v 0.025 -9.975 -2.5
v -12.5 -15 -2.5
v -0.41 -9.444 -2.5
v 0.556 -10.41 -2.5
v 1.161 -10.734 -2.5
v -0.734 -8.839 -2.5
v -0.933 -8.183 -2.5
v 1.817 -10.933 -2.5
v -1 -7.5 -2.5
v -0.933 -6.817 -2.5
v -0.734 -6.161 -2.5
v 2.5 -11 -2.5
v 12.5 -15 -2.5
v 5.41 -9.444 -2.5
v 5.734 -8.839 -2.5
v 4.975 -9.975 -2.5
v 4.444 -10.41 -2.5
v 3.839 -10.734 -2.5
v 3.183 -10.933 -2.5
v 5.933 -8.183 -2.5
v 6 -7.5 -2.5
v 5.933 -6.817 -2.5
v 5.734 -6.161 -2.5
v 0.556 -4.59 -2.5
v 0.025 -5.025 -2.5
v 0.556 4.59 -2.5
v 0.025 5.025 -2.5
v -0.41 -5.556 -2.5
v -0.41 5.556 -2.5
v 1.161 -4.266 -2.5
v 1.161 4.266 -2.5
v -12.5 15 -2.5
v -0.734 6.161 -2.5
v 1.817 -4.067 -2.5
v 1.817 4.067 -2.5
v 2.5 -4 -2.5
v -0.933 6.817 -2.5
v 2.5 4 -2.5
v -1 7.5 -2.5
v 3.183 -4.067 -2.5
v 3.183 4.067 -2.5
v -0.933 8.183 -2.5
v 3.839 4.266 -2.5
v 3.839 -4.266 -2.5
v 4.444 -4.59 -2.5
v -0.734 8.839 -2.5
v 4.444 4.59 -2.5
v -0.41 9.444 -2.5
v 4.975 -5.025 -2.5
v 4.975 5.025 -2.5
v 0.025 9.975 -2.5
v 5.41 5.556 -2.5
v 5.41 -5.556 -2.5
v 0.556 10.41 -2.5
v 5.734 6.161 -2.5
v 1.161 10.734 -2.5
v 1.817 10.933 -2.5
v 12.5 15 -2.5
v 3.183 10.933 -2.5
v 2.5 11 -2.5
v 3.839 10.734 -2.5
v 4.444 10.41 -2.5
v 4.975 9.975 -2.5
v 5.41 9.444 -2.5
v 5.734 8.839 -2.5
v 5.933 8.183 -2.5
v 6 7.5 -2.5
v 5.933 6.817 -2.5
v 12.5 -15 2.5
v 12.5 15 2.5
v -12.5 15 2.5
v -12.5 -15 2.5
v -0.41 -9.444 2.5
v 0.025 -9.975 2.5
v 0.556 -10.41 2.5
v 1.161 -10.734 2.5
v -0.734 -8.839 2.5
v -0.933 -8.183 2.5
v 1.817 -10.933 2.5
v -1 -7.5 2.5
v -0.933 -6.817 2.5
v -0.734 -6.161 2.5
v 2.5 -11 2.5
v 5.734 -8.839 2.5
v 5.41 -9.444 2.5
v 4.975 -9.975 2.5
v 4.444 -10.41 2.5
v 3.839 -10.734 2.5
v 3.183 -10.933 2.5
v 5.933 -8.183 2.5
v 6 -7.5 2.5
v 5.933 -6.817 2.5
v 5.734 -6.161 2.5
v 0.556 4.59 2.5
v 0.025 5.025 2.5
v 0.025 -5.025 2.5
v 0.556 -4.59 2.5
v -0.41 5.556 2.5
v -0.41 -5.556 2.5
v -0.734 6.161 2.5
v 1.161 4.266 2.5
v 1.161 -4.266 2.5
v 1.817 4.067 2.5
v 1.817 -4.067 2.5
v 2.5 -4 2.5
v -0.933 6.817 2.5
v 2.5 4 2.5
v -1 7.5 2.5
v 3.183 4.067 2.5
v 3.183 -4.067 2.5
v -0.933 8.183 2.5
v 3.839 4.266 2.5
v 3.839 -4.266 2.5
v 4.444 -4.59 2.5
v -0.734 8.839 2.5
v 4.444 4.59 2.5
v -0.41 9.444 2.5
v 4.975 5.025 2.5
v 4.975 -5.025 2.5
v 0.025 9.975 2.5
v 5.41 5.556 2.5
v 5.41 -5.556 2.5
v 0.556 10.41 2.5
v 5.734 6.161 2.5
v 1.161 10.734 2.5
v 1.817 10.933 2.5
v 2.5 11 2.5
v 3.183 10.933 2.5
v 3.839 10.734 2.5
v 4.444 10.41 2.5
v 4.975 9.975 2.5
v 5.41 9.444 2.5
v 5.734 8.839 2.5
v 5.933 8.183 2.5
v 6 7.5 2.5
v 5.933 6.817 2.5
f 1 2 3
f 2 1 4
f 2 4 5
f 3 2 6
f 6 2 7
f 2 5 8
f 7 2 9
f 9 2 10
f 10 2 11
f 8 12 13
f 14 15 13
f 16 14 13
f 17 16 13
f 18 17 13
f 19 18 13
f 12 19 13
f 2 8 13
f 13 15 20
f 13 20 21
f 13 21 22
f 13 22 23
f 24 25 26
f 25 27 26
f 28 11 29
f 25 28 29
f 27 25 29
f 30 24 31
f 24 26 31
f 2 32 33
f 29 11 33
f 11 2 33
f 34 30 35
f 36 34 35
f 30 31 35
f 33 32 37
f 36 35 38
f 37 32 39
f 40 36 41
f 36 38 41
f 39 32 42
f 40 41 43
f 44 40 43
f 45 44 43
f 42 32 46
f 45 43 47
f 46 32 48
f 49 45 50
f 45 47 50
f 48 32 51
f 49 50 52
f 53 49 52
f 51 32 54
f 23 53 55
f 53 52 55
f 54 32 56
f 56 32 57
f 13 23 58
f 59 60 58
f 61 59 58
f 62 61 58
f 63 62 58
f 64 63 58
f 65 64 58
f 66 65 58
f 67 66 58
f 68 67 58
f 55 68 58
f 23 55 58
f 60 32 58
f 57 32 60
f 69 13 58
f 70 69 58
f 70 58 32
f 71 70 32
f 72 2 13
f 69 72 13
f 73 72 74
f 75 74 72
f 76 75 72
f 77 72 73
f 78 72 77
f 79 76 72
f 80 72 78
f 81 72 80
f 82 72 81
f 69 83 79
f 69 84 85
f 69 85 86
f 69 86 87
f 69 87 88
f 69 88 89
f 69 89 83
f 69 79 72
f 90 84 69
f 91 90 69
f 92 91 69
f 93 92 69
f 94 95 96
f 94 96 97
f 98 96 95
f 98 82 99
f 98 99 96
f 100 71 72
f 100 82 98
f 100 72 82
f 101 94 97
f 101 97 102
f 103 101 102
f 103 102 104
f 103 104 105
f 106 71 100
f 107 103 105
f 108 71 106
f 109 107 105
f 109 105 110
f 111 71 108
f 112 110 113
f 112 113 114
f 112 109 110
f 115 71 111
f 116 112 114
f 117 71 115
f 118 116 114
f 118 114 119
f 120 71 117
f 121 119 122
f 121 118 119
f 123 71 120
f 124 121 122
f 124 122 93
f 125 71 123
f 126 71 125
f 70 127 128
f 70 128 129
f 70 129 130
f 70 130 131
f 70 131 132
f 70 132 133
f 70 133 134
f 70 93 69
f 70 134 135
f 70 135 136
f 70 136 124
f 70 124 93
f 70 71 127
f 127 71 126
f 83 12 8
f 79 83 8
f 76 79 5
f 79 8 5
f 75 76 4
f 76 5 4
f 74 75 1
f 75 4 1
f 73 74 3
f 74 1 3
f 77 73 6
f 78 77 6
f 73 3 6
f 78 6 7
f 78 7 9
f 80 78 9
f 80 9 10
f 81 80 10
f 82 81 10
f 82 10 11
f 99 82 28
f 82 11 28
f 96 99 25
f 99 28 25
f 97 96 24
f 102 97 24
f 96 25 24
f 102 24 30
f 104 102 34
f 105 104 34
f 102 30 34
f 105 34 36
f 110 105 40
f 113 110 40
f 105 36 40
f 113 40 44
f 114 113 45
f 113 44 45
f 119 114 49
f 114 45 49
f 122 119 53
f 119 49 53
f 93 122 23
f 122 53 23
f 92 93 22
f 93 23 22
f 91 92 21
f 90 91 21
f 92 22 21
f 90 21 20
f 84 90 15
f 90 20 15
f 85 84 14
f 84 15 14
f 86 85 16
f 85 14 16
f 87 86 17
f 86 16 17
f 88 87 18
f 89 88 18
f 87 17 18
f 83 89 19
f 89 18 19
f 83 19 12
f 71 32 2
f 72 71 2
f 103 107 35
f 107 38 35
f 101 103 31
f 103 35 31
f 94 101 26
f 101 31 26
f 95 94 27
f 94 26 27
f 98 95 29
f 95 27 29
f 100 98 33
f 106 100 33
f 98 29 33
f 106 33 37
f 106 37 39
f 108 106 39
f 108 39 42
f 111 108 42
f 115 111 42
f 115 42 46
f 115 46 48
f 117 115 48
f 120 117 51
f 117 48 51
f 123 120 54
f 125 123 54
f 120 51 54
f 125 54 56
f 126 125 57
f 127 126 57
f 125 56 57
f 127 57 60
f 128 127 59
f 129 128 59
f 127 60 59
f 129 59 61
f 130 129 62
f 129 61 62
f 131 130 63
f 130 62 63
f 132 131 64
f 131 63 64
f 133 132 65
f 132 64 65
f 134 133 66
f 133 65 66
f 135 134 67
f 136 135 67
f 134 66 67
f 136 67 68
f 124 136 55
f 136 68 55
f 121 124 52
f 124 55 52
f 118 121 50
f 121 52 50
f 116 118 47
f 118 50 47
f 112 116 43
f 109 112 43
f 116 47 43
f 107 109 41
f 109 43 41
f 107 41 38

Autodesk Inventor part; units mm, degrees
ref_plane "YZ Plane" through (0, 0, 0) normal (1, 0, 0) x (0, 1, 0)
ref_plane "XZ Plane" through (0, 0, 0) normal (0, 1, 0) x (-1, 0, 0)
ref_plane "XY Plane" through (0, 0, 0) normal (0, 0, 1) x (1, 0, 0)
sketch "Sketch1" plane through (0, 0, 0) normal (0, 0, 1) x (1, 0, 0)
  line L0 (-12.5, -15) -> (12.5, -15)
  line L1 (12.5, -15) -> (12.5, 15)
  line L2 (12.5, 15) -> (-12.5, 15)
  line L3 (-12.5, 15) -> (-12.5, -15)
  line L4 (-12.5, -15) -> (12.5, 15) construction
  line L5 (12.5, -15) -> (-12.5, 15) construction
  point P0 (0, 0)
  dimension "d0" = 30
  dimension "d1" = 25
extrude "Extrusion1" add sketch "Sketch1" along normal mid plane 5
sketch "Sketch2" plane through (0, 0, 2.5) normal (0, 0, 1) x (1, 0, 0)
  line L0 (-12.5, 15) -> (-12.5, -15) projected
  line L1 (12.5, 15) -> (-12.5, 15) projected
  point P0 (0, 0)
  point P1 (2.5, 7.5)
  point P2 (2.5, -7.5)
  dimension "d4" = 15
  dimension "d5" = 7.5
  dimension "d6" = 15
hole "Hole1" at (2.5, 7.5, 2.5) at (2.5, -7.5, 2.5) direction (0, 0, -1) diameter 7 depth 14.2 tip angle 118
properties part number "HCMUTE-CDT23-DE_CHEM_LOADCELL" material "PMMA Plastic"
